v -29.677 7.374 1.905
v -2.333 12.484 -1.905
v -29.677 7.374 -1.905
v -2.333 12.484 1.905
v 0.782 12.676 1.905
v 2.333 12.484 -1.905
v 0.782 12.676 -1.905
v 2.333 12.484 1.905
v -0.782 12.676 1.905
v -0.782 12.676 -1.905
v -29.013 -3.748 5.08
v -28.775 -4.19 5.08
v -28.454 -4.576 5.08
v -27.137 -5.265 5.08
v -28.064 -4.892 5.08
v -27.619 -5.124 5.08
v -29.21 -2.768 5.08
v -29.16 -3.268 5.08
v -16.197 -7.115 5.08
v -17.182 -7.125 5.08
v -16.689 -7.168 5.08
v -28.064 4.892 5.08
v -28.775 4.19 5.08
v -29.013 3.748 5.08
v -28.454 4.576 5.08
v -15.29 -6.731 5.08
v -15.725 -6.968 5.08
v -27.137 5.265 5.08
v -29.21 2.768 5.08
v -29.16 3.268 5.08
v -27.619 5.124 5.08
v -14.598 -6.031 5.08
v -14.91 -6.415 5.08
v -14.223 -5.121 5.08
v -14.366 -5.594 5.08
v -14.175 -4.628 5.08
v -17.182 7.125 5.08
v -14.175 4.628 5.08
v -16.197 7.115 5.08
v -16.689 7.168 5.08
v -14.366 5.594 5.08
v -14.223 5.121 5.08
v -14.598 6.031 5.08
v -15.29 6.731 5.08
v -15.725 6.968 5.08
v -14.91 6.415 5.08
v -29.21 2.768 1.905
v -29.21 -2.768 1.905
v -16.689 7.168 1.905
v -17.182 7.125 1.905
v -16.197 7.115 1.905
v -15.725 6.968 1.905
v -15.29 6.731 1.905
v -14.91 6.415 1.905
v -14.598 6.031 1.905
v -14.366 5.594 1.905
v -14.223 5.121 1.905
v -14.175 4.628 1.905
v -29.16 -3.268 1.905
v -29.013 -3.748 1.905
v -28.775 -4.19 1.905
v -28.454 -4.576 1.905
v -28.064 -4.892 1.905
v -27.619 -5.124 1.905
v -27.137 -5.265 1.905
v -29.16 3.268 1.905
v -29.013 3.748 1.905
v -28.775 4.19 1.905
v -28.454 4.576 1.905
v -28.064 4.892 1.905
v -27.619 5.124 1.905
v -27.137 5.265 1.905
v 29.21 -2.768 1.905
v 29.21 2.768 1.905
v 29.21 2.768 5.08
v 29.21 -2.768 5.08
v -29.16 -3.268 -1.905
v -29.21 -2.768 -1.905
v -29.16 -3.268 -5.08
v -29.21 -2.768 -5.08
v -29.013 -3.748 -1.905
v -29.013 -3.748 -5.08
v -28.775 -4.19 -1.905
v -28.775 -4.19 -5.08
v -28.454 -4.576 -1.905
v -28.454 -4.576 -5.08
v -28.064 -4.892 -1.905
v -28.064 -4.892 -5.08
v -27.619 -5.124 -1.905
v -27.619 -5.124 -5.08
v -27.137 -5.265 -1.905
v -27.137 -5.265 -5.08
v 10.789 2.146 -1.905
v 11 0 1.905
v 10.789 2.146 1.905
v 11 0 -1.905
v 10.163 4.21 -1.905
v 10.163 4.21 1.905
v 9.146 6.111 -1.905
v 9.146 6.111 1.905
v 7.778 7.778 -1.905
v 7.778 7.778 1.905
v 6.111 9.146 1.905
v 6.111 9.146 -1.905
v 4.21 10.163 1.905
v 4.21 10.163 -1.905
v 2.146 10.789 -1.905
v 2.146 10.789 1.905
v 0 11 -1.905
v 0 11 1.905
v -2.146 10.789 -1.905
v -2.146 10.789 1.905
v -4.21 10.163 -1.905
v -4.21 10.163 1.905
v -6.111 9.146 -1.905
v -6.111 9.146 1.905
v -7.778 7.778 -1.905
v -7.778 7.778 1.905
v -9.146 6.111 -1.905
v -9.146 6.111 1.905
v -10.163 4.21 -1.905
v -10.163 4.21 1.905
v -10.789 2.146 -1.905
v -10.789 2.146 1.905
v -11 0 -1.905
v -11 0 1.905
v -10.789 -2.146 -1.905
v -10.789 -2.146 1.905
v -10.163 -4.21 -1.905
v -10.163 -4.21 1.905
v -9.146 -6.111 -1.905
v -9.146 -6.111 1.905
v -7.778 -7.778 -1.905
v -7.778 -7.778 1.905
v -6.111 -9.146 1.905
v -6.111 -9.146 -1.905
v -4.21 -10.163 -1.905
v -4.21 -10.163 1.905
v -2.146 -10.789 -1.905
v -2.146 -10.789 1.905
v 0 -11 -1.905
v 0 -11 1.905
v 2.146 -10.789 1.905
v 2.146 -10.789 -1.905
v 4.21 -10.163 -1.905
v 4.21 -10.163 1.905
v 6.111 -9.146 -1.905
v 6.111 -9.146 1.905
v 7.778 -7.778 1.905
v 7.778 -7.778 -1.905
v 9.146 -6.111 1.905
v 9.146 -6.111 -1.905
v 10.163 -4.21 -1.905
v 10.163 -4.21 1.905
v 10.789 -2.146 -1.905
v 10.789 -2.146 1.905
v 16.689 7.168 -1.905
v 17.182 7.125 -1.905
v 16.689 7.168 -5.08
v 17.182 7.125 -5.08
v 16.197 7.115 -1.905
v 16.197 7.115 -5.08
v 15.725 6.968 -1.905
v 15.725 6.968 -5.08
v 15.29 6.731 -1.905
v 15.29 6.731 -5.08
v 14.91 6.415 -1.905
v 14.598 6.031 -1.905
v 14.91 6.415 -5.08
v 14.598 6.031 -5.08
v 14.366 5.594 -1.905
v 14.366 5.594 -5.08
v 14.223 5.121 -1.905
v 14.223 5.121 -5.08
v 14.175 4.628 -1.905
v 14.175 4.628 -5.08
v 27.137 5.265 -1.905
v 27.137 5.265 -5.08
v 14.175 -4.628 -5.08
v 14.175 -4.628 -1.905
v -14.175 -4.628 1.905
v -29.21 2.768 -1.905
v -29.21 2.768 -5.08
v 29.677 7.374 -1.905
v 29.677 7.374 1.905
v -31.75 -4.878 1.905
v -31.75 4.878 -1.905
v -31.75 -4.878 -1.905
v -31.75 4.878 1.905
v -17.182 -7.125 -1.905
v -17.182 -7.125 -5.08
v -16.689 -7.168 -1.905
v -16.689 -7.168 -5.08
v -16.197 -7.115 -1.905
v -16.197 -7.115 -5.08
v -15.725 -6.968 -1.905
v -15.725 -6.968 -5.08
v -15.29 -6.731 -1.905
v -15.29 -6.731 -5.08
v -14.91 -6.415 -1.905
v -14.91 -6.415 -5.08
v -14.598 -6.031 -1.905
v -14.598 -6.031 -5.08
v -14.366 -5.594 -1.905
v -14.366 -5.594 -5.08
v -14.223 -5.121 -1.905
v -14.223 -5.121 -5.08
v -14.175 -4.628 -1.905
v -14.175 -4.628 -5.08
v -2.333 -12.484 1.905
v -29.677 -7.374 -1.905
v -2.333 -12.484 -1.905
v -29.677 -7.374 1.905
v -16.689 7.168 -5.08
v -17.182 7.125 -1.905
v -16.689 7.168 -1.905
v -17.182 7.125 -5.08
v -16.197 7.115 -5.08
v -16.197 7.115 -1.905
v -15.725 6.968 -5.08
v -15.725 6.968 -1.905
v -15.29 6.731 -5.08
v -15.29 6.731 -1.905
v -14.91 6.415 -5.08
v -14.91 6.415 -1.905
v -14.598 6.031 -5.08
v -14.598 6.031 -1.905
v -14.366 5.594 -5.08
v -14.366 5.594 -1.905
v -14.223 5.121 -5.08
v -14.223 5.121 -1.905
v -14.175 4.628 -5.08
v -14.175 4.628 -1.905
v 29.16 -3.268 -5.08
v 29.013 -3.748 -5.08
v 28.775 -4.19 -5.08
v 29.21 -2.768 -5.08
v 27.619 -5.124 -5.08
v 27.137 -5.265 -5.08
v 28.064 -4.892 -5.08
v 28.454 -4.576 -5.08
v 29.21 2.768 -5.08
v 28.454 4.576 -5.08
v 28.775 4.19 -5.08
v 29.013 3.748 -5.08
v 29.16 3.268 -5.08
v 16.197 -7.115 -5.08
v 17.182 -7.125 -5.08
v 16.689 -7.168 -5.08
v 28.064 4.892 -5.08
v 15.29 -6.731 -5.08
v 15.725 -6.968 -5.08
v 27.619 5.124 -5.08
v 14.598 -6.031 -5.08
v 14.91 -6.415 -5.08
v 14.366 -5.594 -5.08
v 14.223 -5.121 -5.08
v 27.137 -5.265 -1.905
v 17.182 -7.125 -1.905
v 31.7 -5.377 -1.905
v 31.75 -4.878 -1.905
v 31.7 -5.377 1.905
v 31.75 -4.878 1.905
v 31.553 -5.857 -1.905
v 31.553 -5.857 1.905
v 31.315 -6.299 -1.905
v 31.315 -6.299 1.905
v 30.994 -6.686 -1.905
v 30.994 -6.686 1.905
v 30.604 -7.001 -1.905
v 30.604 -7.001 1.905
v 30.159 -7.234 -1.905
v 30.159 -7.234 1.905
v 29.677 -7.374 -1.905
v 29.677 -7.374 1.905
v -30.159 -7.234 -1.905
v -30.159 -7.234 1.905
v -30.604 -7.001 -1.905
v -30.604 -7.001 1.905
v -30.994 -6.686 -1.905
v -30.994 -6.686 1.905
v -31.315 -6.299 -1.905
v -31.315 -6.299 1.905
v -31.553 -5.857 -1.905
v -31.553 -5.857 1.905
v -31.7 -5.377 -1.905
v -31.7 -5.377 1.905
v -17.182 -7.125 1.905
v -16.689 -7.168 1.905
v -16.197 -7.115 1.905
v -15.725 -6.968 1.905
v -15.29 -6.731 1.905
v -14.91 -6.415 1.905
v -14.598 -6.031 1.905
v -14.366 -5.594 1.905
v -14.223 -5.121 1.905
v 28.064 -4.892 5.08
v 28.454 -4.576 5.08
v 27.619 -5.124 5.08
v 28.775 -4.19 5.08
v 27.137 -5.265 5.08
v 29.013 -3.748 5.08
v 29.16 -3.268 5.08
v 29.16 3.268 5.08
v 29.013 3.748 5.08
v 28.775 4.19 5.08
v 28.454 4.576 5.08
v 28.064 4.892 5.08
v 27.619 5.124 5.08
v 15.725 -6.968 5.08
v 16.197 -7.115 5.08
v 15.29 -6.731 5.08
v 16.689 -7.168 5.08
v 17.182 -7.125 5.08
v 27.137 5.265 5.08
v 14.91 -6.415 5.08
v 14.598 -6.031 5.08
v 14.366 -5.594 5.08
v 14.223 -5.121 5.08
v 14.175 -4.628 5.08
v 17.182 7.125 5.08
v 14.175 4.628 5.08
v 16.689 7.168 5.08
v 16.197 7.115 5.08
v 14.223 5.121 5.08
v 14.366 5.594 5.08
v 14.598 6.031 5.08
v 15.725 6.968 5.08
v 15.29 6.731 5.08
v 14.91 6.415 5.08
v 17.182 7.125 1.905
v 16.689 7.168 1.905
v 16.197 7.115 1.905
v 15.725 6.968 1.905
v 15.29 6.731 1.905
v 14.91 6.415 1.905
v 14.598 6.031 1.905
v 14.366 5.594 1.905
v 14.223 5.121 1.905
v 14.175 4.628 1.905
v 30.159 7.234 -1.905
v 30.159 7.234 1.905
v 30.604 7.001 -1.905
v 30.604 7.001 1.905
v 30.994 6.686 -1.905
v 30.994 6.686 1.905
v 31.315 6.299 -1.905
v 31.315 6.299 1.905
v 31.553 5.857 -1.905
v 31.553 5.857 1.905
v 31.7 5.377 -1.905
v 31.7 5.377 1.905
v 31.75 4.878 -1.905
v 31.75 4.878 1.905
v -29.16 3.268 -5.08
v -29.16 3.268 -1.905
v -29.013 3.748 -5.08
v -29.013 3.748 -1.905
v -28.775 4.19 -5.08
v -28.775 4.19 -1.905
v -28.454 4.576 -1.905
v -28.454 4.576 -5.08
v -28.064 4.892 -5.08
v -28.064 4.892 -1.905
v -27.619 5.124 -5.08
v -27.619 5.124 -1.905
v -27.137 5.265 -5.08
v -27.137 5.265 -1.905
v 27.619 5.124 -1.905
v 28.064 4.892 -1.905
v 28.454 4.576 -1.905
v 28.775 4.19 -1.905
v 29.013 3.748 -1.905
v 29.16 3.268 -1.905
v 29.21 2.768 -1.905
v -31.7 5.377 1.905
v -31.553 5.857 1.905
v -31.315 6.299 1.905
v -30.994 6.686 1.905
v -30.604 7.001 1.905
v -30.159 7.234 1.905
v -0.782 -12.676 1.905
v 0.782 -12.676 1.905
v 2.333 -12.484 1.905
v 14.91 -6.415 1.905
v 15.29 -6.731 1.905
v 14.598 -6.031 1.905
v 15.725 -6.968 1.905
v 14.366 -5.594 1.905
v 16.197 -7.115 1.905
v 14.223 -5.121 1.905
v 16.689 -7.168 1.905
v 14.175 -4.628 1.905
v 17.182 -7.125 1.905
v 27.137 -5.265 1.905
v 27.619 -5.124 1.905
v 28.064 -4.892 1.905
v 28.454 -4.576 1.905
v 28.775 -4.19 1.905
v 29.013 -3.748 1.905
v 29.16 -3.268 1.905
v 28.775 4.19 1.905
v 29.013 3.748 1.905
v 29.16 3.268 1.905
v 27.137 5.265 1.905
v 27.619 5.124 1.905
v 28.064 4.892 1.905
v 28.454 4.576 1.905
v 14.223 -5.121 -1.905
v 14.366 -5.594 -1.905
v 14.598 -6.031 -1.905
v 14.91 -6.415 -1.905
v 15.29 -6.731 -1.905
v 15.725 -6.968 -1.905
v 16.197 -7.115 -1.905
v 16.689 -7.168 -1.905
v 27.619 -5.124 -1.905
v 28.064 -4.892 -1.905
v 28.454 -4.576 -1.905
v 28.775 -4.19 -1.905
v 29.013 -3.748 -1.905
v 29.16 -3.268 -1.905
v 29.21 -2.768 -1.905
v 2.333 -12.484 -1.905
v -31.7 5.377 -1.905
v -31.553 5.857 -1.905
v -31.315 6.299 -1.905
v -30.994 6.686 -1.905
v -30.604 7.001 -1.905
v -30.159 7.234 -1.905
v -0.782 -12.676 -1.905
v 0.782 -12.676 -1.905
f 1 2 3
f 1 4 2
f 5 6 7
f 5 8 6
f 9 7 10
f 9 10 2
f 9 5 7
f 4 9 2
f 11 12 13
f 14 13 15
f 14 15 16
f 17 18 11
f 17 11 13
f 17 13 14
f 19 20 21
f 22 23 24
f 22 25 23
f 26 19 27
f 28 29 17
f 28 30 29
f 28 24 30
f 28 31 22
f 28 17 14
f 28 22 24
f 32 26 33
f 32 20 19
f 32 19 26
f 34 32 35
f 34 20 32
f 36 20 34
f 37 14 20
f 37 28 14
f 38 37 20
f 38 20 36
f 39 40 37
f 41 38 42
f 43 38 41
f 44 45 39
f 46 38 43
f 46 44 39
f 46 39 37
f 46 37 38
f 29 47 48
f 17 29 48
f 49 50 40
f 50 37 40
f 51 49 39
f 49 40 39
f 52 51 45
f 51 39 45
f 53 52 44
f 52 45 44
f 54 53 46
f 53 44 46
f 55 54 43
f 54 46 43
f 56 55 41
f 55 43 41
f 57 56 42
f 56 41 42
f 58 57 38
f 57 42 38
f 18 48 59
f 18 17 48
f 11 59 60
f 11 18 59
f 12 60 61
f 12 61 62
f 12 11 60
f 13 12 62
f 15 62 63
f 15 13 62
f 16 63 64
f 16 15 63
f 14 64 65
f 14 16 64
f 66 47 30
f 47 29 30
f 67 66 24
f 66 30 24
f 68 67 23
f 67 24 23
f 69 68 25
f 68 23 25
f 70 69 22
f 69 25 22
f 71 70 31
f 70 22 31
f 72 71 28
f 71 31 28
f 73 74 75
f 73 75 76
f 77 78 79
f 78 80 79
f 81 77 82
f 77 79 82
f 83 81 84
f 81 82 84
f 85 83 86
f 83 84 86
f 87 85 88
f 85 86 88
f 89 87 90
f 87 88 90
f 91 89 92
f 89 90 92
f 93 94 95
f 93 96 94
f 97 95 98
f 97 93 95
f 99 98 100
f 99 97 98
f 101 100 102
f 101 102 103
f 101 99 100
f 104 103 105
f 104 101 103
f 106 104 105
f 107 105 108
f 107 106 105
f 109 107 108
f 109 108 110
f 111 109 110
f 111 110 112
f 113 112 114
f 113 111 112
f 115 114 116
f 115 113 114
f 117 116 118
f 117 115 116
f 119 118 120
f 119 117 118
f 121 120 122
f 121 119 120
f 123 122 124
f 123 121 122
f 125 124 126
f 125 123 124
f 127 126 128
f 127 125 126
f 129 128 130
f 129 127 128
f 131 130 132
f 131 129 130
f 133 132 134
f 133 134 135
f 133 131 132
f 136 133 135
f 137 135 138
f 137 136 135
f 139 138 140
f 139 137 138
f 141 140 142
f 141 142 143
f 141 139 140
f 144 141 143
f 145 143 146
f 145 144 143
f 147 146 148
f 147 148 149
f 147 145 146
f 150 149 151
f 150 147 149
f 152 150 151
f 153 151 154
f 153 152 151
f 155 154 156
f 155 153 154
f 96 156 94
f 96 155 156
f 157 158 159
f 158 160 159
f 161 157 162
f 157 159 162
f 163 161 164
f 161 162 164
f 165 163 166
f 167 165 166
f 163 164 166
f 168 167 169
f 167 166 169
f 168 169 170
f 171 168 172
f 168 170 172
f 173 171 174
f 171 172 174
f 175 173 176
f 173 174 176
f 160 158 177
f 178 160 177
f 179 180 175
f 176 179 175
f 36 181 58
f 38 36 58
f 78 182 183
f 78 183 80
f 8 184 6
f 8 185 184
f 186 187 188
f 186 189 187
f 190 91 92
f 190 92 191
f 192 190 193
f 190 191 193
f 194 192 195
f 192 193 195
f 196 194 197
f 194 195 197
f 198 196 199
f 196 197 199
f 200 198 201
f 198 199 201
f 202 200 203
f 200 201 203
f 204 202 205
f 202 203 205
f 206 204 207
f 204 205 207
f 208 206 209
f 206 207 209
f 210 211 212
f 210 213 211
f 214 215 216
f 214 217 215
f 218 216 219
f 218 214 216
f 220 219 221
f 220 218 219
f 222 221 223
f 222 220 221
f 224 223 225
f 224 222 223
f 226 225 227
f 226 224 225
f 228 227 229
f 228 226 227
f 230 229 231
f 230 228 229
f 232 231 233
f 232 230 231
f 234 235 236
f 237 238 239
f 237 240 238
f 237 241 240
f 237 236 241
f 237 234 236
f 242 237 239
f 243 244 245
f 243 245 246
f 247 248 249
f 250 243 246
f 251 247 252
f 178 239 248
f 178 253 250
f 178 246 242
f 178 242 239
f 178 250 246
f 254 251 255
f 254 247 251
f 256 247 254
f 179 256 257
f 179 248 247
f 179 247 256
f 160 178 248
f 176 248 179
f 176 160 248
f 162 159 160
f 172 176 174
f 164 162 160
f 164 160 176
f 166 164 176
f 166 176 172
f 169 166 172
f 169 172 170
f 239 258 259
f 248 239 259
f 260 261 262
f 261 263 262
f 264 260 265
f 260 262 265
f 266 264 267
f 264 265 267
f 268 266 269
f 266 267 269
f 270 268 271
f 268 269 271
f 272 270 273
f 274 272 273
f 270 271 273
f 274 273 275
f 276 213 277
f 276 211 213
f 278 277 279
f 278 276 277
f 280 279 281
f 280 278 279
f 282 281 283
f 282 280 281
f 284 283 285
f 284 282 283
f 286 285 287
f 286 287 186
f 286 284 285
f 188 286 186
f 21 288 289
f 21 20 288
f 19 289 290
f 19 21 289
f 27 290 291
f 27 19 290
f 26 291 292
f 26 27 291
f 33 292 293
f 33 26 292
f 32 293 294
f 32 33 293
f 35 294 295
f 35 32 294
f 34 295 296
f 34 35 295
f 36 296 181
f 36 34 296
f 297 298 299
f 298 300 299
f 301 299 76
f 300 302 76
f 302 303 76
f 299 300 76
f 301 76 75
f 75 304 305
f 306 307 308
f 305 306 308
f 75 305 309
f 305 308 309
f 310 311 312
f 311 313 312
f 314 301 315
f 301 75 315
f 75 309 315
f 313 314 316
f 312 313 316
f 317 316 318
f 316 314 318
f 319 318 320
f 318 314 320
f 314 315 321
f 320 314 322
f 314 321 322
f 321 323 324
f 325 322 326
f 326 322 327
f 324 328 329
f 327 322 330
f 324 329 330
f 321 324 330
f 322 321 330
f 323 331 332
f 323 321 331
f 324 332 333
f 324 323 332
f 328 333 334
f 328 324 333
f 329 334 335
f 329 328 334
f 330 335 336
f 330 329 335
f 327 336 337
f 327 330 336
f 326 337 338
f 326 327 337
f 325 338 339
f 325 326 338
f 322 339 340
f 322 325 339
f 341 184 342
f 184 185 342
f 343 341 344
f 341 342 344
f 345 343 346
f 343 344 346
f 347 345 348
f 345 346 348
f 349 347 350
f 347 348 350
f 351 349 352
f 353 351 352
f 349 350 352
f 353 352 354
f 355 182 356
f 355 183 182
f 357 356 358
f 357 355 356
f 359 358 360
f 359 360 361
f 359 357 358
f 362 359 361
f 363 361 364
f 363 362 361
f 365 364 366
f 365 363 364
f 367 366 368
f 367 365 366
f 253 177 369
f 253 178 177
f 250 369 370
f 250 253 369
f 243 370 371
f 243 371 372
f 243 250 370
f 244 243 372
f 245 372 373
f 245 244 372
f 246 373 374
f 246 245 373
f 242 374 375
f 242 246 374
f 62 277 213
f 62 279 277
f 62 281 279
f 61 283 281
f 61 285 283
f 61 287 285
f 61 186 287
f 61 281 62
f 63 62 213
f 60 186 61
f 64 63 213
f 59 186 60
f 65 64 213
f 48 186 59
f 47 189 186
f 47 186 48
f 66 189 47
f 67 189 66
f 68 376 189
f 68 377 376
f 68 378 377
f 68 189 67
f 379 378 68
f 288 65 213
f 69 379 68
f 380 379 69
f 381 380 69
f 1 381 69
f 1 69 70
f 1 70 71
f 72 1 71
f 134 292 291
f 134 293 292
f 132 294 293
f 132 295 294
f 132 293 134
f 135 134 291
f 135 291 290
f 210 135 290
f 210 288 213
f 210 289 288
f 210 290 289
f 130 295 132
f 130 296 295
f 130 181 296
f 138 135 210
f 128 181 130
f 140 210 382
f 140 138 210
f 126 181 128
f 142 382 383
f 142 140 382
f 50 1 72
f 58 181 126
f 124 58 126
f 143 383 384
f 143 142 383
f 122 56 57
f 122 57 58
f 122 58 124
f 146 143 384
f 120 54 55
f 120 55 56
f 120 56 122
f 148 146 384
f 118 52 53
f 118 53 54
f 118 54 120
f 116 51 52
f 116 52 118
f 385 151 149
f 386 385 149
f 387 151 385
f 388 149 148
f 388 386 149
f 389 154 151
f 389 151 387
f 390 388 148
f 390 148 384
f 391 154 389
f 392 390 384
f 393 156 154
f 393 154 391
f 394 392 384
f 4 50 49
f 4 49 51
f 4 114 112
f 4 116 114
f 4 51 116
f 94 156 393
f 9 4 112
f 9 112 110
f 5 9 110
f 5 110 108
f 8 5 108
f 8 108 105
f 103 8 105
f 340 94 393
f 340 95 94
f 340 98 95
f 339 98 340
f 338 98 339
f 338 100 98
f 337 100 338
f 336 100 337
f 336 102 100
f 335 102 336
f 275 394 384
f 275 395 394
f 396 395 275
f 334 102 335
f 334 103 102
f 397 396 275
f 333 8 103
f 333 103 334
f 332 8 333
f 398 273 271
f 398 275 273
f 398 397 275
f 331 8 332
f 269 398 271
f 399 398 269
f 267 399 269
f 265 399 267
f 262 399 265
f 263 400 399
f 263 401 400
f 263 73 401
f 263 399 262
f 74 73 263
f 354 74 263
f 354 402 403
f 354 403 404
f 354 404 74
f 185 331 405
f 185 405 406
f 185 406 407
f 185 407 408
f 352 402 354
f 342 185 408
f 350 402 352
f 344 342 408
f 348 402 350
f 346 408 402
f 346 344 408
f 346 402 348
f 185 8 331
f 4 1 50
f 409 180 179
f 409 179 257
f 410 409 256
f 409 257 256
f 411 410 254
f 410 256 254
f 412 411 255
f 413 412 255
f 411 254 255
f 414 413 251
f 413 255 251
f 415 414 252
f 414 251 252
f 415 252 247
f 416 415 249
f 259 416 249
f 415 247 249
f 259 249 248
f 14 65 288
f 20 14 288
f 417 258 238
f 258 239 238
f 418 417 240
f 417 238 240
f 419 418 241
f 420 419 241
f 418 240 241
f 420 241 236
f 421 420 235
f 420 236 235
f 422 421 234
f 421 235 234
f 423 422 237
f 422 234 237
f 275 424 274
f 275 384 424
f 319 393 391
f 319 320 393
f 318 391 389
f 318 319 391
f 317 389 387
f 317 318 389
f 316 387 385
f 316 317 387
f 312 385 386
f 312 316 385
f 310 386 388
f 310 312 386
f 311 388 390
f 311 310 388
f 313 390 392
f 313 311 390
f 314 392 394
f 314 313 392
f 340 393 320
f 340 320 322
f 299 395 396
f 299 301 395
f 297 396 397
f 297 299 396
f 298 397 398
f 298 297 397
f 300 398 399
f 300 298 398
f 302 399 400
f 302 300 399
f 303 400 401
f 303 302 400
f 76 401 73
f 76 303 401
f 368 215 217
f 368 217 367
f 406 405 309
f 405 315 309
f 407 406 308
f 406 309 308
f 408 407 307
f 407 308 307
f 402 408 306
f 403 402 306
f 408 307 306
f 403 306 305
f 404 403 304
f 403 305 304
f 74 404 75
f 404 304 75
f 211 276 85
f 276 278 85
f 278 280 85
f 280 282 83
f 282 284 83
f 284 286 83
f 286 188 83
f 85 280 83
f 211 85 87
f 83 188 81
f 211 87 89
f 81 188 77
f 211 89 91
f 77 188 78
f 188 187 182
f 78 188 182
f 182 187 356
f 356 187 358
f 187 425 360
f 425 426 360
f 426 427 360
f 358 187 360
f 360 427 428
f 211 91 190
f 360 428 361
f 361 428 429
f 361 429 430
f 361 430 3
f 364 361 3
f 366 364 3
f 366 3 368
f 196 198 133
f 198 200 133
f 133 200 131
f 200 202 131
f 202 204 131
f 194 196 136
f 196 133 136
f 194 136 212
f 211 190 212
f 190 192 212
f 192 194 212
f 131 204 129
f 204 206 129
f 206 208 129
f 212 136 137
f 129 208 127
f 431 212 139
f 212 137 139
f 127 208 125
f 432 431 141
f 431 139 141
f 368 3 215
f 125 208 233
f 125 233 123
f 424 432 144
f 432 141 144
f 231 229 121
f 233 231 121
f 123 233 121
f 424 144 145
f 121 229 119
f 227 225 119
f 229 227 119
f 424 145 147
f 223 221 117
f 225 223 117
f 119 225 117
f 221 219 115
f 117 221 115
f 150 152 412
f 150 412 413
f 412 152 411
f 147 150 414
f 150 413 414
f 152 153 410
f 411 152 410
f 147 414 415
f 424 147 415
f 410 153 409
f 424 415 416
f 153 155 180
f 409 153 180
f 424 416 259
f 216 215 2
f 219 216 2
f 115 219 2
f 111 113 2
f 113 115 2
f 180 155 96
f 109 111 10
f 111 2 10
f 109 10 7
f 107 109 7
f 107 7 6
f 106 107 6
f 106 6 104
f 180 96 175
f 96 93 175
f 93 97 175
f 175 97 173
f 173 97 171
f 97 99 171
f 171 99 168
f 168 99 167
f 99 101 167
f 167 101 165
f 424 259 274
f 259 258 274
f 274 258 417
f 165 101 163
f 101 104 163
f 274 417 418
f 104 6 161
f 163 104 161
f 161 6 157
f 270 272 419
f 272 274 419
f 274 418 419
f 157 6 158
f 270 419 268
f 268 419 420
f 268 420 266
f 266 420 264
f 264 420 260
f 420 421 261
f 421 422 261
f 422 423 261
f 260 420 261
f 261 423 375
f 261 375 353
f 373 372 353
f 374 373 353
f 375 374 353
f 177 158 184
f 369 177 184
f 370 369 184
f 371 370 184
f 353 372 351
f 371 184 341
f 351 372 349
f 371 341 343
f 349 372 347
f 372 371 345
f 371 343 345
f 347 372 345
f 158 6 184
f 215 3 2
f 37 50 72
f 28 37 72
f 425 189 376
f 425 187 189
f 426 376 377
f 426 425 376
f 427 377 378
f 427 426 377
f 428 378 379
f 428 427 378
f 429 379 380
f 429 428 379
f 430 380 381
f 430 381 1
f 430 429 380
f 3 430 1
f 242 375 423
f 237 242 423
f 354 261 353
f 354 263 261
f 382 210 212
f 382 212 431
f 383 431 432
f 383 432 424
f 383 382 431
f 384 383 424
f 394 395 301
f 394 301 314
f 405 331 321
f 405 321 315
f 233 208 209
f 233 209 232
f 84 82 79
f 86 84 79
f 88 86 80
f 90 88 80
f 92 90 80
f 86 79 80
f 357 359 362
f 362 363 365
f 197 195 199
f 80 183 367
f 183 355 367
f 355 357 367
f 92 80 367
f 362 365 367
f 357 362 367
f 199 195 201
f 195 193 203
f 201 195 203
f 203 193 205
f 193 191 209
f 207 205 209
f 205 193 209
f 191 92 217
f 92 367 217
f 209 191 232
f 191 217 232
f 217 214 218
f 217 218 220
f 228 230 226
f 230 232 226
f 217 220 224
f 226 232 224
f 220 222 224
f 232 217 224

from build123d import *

# Parameters (mm, degrees)
F0_R             = 11
F1_DEPTH         = 1.905
F3_R             = 2.54
F4_DEPTH         = 3.175
F4_COPIES2_COUNT = 2
F5_R             = 2.54


# Not quite as in the source:
# - a pattern or mirror of a feature is missing from the dataset's text; its kind, count and spacing are read off the source's solid


with BuildPart() as f1:
    # F0 (on Top) → F1 (new body, symmetric)
    with BuildSketch(Plane.XY):
        with BuildLine():
            Line((-31.75, -6.9869237544), (-2.3327823548, -12.4839147099))
            ThreePointArc((-2.3327823548, -12.4839147099), (0, -12.7), (2.3327823548, -12.4839147099))
            Line((2.3327823548, -12.4839147099), (31.75, -6.9869237544))
            Line((31.75, -6.9869237544), (31.75, 6.9869237544))
            Line((31.75, 6.9869237544), (2.3327823548, 12.4839147099))
            ThreePointArc((2.3327823548, 12.4839147099), (0, 12.7), (-2.3327823548, 12.4839147099))
            Line((-2.3327823548, 12.4839147099), (-31.75, 6.9869237544))
            Line((-31.75, 6.9869237544), (-31.75, -6.9869237544))
        make_face()
        Circle(F0_R, mode=Mode.SUBTRACT)
    extrude(amount=F1_DEPTH, both=True)

    # F3
    f3_edges = [f1.edges().sort_by_distance(p)[0] for p in [
        (-31.75, 6.986924, 0),
        (-31.75, -6.986924, 0),
        (31.75, -6.986924, 0),
        (31.75, 6.986924, 0),
    ]]
    fillet(f3_edges, radius=F3_R)

    # F2 (on face) → F4 (join)
    with BuildSketch(Plane.XY.offset(1.905)):
        Polygon((-29.21, 4.8775907903), (-29.21, -4.8775907903), (-14.175, -7.6870767183), (-14.175, 7.6870767183), align=None)
    f4 = extrude(amount=F4_DEPTH)

    # F4_copies: F4 across plane
    add(f4.mirror(Plane(origin=(0, 0, 0), x_dir=(0, 0, 1), z_dir=(1, 0, 0))))

    # F4_copies1: F4 across plane
    add(f4.mirror(Plane(origin=(0, 0, 0), x_dir=(-1, 0, 0), z_dir=(0, 0, -1))))

    # F4_copies2: F4 ×2 about axis
    f4_copies2_axis = Axis((0, 0, 0), (0, 1, 0))
    for i in range(1, F4_COPIES2_COUNT):
        add(f4.rotate(f4_copies2_axis, i * 360 / F4_COPIES2_COUNT))

    # F5
    f5_edges = [f1.edges().sort_by_distance(p)[0] for p in [
        (-29.21, -4.877591, 3.4925),
        (-14.175, -7.687077, 3.4925),
        (-14.175, 7.687077, 3.4925),
        (-29.21, 4.877591, 3.4925),
        (-14.175, -7.687077, -3.4925),
        (-14.175, 7.687077, -3.4925),
        (-29.21, -4.877591, -3.4925),
        (-29.21, 4.877591, -3.4925),
        (29.21, -4.877591, -3.4925),
        (14.175, -7.687077, -3.4925),
        (29.21, 4.877591, -3.4925),
        (14.175, 7.687077, -3.4925),
        (29.21, -4.877591, 3.4925),
        (14.175, -7.687077, 3.4925),
        (29.21, 4.877591, 3.4925),
        (14.175, 7.687077, 3.4925),
    ]]
    fillet(f5_edges, radius=F5_R)


solid = f1.part
